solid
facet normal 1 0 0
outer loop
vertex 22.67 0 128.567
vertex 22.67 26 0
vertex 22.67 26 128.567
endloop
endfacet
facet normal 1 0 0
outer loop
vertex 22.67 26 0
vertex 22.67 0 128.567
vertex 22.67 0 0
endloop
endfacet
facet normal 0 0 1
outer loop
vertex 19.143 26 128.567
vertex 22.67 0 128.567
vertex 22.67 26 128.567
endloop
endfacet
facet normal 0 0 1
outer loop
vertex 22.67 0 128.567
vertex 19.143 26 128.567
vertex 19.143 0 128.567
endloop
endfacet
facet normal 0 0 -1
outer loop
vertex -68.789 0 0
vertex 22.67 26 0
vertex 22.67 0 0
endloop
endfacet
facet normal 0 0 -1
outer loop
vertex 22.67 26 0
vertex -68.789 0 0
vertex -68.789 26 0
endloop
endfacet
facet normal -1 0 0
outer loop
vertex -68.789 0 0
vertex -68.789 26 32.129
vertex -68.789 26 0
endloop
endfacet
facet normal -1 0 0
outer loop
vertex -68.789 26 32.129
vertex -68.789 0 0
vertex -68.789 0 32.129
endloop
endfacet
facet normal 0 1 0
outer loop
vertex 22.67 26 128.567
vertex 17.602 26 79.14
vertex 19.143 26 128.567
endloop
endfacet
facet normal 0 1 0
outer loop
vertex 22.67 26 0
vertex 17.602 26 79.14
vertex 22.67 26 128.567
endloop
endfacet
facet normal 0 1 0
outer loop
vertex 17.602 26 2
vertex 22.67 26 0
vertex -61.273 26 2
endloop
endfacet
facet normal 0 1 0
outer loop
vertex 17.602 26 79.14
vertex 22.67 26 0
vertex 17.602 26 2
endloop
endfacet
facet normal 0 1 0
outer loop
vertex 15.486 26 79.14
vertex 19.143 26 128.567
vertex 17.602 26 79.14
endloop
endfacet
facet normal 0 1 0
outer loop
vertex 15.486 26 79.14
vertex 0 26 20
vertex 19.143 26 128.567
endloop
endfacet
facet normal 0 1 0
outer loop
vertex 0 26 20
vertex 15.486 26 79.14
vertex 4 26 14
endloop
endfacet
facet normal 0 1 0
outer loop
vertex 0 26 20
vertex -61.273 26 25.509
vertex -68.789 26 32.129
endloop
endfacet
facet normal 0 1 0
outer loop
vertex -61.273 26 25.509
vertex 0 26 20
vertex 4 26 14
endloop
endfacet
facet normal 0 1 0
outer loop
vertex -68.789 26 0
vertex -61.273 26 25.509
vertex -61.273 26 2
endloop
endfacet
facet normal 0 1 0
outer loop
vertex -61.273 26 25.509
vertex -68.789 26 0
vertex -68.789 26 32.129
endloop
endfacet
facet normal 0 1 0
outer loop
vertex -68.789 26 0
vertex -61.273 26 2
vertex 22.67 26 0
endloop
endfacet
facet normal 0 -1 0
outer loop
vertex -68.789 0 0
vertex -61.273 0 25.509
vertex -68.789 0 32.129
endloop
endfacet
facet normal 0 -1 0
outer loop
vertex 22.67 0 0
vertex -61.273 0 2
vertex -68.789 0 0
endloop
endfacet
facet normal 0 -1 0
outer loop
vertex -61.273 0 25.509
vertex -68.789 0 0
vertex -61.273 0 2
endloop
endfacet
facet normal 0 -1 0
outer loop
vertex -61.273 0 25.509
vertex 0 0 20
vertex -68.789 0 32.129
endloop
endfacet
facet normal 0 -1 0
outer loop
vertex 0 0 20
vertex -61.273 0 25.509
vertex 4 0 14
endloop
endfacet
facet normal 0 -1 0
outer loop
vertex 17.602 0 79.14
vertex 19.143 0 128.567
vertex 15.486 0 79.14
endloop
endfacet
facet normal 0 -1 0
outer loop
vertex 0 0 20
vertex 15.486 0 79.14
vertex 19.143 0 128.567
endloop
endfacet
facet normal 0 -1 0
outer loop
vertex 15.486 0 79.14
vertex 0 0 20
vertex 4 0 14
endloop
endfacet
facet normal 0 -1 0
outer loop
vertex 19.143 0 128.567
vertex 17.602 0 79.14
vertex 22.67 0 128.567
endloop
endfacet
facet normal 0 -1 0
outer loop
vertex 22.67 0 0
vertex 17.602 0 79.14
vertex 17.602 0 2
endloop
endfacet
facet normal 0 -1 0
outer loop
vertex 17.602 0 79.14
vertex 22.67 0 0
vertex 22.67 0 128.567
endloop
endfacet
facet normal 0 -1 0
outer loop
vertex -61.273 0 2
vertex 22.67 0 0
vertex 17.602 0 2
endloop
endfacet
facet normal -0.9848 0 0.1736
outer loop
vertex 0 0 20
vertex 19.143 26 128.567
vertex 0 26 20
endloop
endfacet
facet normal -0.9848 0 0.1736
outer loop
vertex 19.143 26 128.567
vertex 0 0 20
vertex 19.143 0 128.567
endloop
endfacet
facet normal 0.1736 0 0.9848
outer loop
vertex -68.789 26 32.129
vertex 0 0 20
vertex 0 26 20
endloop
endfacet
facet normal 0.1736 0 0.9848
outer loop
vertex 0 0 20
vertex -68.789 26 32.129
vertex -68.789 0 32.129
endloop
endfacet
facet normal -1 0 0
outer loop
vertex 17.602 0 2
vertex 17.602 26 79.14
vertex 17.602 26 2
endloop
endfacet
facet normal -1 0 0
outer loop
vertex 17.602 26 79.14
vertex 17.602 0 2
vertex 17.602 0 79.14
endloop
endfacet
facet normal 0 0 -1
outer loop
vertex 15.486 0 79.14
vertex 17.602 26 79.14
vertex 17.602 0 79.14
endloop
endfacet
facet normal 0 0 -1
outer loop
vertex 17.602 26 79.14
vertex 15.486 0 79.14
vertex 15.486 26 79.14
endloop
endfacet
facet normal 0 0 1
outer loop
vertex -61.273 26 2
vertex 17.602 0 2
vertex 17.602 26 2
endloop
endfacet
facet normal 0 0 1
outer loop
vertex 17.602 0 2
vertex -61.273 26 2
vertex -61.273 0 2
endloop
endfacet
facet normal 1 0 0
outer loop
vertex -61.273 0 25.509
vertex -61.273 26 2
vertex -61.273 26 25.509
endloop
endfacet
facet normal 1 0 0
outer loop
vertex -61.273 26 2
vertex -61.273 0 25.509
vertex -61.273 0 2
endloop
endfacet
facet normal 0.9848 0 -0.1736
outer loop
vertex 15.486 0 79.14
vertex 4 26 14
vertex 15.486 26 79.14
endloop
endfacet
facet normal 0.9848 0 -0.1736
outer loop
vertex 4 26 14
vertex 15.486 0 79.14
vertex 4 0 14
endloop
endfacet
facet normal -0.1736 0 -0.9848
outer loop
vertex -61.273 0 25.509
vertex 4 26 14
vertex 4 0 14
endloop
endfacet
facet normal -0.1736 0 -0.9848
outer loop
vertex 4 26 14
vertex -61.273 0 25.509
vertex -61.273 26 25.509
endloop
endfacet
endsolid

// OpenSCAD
// make noise case 60deg riser wedge
//
// case dimensions: 
//   130.55mm x 69.85mm x 546.1mm
//
w = 26; // width of riser
x = 130.55; // case dimensions
y = 546.10; 
z =  69.85;
z_alt = z + 100; // inflated depth to clear overlap

t = -80; // angle of rotation, 'theta', in degrees
r = 20; // rise in mm

module case() {
  translate([0, 0, r]) // raised
    rotate([0, t, 0]) // rotated
      cube([x, y, z]);
}

module riser(x_add) {
  // x-offset generated by rotation of z component, plus additional x-offset
  x_z_offset = -sin(t) * z + x_add; 
  x_y_offset = cos(t) * x; // x-offset generated by rotation of y component
  z_x_offset = -sin(t) * x; // z-offset generated by rotation of x component

  difference() {
    // encapsulating volume
      translate([-x_z_offset, 0, 0])
        cube([x_z_offset + x_y_offset, w, z_x_offset]);

    // the case, tilted and raised.
    // exaggerated depth to clear front panel
    translate([0, 0, r])
    rotate([0, t, 0])
      cube([x, y, z_alt]);
  }
}

// currently manually scaled/hollowed
// s/b calculated from riser shape and angle
module hollow_riser() {
  difference() {
    riser(0);
    translate([4, 0, 2])
      scale([0.6, 1.1, 0.6])
        riser(40);
  }
}

// case();
// riser(0);
hollow_riser();
